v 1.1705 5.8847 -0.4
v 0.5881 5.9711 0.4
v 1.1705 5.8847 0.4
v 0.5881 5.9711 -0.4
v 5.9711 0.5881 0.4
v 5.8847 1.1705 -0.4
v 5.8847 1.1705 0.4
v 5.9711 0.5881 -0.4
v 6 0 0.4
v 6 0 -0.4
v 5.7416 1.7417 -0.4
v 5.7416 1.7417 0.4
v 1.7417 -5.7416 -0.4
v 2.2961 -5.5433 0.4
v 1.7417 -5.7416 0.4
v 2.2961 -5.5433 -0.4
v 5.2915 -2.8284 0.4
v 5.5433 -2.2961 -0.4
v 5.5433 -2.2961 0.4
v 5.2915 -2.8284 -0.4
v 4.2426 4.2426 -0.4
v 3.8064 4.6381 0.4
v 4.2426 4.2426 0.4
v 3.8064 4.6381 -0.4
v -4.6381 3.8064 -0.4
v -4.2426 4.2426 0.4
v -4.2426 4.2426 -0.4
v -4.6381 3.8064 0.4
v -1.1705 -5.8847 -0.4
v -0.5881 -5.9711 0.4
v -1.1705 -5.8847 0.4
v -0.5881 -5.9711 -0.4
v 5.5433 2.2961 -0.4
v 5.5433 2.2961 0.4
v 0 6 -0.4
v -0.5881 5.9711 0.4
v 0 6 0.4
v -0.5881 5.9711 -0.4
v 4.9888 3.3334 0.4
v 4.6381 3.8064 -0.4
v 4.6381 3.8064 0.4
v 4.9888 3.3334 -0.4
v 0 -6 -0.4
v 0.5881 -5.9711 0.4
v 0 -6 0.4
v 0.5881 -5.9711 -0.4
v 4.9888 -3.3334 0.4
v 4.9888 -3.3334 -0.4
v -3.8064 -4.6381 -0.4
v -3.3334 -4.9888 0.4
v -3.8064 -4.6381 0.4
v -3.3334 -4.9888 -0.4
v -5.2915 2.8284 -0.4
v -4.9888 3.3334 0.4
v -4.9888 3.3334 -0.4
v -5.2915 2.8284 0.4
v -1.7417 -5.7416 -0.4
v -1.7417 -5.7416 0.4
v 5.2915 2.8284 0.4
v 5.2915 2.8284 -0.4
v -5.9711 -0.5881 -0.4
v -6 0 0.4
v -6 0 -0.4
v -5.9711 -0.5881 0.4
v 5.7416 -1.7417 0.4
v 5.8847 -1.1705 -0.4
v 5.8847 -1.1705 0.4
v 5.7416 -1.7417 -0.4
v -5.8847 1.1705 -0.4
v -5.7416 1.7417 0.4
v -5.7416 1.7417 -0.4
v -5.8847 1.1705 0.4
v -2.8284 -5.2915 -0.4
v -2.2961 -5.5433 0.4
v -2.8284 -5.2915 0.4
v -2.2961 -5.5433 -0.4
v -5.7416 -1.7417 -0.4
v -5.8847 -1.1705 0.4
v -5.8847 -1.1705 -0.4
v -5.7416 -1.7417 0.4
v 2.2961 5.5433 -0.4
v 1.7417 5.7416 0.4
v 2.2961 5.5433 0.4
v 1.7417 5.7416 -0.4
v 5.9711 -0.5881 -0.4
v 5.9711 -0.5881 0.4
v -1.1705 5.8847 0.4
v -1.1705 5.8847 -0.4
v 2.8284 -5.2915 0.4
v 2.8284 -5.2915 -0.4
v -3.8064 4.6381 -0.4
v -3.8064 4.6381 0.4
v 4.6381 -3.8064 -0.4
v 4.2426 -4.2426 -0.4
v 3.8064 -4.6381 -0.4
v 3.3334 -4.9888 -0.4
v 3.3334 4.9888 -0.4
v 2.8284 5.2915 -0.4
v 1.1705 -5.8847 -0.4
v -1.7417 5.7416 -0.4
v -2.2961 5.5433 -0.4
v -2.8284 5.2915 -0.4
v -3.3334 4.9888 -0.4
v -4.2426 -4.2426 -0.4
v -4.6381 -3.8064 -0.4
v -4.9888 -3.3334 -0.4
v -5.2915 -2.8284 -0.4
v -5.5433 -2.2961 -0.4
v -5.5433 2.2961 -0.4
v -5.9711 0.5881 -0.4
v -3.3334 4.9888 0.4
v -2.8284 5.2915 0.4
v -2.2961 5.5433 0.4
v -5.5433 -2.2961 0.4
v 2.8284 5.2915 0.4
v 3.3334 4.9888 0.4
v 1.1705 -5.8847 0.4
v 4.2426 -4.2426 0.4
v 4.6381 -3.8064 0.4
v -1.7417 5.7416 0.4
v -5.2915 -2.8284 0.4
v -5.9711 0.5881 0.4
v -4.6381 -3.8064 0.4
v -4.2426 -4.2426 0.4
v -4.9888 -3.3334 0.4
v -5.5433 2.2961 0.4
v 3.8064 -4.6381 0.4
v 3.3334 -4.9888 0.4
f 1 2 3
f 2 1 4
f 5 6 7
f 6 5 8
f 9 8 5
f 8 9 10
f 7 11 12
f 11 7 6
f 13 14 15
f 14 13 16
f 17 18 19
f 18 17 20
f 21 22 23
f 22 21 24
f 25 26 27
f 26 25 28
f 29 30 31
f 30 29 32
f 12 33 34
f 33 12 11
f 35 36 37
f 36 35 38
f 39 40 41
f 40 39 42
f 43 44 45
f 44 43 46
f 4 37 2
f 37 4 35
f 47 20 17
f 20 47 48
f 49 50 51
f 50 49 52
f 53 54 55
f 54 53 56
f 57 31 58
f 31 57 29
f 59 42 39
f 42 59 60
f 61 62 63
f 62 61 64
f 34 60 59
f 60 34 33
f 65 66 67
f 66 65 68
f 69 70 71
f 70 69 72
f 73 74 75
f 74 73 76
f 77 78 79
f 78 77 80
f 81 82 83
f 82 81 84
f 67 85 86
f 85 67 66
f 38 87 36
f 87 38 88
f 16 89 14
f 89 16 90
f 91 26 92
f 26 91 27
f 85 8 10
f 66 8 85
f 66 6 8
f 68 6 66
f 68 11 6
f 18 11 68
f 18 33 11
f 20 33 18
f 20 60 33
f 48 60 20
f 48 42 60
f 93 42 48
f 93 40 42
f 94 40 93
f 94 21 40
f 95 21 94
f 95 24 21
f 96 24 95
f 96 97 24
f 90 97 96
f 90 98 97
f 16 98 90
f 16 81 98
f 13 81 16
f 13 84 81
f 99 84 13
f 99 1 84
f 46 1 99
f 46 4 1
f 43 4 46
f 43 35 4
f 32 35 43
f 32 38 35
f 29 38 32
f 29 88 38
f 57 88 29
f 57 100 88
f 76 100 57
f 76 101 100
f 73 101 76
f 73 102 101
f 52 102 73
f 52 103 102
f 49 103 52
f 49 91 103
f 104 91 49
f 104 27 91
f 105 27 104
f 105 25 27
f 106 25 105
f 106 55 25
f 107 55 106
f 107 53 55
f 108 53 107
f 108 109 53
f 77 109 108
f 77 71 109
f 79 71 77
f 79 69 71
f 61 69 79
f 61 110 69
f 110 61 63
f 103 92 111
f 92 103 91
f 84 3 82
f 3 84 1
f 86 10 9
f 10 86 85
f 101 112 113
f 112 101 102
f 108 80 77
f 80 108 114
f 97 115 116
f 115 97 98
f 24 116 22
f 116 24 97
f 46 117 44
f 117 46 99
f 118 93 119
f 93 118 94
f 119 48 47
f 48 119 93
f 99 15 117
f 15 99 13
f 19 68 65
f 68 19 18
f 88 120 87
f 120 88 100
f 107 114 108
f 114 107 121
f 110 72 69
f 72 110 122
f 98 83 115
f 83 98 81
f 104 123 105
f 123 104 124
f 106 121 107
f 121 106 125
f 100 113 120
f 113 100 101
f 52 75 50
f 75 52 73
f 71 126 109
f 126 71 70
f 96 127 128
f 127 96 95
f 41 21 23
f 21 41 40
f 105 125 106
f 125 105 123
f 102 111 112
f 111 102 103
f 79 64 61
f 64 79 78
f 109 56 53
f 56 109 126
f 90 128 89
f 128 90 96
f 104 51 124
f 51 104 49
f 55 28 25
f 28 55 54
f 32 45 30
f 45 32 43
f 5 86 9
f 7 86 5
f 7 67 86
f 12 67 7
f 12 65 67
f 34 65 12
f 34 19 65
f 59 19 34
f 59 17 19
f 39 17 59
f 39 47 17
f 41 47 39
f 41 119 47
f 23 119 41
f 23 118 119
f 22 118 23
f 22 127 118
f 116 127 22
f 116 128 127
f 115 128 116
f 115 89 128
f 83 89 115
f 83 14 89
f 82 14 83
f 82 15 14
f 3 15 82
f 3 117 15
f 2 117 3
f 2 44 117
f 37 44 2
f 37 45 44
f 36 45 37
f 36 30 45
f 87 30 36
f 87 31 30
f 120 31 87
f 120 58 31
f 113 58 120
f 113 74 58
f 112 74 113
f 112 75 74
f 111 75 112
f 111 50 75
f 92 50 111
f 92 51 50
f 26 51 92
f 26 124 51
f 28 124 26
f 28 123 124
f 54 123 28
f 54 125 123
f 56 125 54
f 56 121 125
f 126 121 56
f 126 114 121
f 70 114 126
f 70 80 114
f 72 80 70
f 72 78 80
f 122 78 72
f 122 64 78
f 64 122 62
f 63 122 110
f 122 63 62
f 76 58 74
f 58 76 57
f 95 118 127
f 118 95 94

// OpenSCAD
// Parameters
inner_diameter = 3.0; //[1.5:6.0:0.1]
outer_diameter = 12.0; //[6.0:24.0:0.1]
thickness = 0.8; //[0.4:1.6:0.05]
eps = 0.6; //[0.2:2.0:0.1]

// Penny Washer - complete geometry
module penny_washer() {
  color("Silver") {
    difference() {
      // Outer ring
      cylinder(r=outer_diameter/2, h=thickness, center=true, $fn=64);
      // Inner hole
      cylinder(r=inner_diameter/2, h=thickness + 2*eps, center=true, $fn=64);
    }
  }
}

// Round Grommet Top - complete geometry
module round_grommet_top() {
  color("DimGray") {
    // Grommet top
    cylinder(r=outer_diameter/2, h=thickness, center=true, $fn=64);
  }
}

// Round Grommet Assembly - complete geometry
module round_grommet_assembly() {
  color("DimGray") {
    union() {
      penny_washer();
      round_grommet_top();
    }
  }
}

// Screw And Washer - complete geometry
module screw_and_washer() {
  color("Black") {
    union() {
      round_grommet_assembly();
      // Additional screw head or detail can be added here if needed
    }
  }
}

// Final Assembly
module assembly() {
  screw_and_washer();
}

assembly();
